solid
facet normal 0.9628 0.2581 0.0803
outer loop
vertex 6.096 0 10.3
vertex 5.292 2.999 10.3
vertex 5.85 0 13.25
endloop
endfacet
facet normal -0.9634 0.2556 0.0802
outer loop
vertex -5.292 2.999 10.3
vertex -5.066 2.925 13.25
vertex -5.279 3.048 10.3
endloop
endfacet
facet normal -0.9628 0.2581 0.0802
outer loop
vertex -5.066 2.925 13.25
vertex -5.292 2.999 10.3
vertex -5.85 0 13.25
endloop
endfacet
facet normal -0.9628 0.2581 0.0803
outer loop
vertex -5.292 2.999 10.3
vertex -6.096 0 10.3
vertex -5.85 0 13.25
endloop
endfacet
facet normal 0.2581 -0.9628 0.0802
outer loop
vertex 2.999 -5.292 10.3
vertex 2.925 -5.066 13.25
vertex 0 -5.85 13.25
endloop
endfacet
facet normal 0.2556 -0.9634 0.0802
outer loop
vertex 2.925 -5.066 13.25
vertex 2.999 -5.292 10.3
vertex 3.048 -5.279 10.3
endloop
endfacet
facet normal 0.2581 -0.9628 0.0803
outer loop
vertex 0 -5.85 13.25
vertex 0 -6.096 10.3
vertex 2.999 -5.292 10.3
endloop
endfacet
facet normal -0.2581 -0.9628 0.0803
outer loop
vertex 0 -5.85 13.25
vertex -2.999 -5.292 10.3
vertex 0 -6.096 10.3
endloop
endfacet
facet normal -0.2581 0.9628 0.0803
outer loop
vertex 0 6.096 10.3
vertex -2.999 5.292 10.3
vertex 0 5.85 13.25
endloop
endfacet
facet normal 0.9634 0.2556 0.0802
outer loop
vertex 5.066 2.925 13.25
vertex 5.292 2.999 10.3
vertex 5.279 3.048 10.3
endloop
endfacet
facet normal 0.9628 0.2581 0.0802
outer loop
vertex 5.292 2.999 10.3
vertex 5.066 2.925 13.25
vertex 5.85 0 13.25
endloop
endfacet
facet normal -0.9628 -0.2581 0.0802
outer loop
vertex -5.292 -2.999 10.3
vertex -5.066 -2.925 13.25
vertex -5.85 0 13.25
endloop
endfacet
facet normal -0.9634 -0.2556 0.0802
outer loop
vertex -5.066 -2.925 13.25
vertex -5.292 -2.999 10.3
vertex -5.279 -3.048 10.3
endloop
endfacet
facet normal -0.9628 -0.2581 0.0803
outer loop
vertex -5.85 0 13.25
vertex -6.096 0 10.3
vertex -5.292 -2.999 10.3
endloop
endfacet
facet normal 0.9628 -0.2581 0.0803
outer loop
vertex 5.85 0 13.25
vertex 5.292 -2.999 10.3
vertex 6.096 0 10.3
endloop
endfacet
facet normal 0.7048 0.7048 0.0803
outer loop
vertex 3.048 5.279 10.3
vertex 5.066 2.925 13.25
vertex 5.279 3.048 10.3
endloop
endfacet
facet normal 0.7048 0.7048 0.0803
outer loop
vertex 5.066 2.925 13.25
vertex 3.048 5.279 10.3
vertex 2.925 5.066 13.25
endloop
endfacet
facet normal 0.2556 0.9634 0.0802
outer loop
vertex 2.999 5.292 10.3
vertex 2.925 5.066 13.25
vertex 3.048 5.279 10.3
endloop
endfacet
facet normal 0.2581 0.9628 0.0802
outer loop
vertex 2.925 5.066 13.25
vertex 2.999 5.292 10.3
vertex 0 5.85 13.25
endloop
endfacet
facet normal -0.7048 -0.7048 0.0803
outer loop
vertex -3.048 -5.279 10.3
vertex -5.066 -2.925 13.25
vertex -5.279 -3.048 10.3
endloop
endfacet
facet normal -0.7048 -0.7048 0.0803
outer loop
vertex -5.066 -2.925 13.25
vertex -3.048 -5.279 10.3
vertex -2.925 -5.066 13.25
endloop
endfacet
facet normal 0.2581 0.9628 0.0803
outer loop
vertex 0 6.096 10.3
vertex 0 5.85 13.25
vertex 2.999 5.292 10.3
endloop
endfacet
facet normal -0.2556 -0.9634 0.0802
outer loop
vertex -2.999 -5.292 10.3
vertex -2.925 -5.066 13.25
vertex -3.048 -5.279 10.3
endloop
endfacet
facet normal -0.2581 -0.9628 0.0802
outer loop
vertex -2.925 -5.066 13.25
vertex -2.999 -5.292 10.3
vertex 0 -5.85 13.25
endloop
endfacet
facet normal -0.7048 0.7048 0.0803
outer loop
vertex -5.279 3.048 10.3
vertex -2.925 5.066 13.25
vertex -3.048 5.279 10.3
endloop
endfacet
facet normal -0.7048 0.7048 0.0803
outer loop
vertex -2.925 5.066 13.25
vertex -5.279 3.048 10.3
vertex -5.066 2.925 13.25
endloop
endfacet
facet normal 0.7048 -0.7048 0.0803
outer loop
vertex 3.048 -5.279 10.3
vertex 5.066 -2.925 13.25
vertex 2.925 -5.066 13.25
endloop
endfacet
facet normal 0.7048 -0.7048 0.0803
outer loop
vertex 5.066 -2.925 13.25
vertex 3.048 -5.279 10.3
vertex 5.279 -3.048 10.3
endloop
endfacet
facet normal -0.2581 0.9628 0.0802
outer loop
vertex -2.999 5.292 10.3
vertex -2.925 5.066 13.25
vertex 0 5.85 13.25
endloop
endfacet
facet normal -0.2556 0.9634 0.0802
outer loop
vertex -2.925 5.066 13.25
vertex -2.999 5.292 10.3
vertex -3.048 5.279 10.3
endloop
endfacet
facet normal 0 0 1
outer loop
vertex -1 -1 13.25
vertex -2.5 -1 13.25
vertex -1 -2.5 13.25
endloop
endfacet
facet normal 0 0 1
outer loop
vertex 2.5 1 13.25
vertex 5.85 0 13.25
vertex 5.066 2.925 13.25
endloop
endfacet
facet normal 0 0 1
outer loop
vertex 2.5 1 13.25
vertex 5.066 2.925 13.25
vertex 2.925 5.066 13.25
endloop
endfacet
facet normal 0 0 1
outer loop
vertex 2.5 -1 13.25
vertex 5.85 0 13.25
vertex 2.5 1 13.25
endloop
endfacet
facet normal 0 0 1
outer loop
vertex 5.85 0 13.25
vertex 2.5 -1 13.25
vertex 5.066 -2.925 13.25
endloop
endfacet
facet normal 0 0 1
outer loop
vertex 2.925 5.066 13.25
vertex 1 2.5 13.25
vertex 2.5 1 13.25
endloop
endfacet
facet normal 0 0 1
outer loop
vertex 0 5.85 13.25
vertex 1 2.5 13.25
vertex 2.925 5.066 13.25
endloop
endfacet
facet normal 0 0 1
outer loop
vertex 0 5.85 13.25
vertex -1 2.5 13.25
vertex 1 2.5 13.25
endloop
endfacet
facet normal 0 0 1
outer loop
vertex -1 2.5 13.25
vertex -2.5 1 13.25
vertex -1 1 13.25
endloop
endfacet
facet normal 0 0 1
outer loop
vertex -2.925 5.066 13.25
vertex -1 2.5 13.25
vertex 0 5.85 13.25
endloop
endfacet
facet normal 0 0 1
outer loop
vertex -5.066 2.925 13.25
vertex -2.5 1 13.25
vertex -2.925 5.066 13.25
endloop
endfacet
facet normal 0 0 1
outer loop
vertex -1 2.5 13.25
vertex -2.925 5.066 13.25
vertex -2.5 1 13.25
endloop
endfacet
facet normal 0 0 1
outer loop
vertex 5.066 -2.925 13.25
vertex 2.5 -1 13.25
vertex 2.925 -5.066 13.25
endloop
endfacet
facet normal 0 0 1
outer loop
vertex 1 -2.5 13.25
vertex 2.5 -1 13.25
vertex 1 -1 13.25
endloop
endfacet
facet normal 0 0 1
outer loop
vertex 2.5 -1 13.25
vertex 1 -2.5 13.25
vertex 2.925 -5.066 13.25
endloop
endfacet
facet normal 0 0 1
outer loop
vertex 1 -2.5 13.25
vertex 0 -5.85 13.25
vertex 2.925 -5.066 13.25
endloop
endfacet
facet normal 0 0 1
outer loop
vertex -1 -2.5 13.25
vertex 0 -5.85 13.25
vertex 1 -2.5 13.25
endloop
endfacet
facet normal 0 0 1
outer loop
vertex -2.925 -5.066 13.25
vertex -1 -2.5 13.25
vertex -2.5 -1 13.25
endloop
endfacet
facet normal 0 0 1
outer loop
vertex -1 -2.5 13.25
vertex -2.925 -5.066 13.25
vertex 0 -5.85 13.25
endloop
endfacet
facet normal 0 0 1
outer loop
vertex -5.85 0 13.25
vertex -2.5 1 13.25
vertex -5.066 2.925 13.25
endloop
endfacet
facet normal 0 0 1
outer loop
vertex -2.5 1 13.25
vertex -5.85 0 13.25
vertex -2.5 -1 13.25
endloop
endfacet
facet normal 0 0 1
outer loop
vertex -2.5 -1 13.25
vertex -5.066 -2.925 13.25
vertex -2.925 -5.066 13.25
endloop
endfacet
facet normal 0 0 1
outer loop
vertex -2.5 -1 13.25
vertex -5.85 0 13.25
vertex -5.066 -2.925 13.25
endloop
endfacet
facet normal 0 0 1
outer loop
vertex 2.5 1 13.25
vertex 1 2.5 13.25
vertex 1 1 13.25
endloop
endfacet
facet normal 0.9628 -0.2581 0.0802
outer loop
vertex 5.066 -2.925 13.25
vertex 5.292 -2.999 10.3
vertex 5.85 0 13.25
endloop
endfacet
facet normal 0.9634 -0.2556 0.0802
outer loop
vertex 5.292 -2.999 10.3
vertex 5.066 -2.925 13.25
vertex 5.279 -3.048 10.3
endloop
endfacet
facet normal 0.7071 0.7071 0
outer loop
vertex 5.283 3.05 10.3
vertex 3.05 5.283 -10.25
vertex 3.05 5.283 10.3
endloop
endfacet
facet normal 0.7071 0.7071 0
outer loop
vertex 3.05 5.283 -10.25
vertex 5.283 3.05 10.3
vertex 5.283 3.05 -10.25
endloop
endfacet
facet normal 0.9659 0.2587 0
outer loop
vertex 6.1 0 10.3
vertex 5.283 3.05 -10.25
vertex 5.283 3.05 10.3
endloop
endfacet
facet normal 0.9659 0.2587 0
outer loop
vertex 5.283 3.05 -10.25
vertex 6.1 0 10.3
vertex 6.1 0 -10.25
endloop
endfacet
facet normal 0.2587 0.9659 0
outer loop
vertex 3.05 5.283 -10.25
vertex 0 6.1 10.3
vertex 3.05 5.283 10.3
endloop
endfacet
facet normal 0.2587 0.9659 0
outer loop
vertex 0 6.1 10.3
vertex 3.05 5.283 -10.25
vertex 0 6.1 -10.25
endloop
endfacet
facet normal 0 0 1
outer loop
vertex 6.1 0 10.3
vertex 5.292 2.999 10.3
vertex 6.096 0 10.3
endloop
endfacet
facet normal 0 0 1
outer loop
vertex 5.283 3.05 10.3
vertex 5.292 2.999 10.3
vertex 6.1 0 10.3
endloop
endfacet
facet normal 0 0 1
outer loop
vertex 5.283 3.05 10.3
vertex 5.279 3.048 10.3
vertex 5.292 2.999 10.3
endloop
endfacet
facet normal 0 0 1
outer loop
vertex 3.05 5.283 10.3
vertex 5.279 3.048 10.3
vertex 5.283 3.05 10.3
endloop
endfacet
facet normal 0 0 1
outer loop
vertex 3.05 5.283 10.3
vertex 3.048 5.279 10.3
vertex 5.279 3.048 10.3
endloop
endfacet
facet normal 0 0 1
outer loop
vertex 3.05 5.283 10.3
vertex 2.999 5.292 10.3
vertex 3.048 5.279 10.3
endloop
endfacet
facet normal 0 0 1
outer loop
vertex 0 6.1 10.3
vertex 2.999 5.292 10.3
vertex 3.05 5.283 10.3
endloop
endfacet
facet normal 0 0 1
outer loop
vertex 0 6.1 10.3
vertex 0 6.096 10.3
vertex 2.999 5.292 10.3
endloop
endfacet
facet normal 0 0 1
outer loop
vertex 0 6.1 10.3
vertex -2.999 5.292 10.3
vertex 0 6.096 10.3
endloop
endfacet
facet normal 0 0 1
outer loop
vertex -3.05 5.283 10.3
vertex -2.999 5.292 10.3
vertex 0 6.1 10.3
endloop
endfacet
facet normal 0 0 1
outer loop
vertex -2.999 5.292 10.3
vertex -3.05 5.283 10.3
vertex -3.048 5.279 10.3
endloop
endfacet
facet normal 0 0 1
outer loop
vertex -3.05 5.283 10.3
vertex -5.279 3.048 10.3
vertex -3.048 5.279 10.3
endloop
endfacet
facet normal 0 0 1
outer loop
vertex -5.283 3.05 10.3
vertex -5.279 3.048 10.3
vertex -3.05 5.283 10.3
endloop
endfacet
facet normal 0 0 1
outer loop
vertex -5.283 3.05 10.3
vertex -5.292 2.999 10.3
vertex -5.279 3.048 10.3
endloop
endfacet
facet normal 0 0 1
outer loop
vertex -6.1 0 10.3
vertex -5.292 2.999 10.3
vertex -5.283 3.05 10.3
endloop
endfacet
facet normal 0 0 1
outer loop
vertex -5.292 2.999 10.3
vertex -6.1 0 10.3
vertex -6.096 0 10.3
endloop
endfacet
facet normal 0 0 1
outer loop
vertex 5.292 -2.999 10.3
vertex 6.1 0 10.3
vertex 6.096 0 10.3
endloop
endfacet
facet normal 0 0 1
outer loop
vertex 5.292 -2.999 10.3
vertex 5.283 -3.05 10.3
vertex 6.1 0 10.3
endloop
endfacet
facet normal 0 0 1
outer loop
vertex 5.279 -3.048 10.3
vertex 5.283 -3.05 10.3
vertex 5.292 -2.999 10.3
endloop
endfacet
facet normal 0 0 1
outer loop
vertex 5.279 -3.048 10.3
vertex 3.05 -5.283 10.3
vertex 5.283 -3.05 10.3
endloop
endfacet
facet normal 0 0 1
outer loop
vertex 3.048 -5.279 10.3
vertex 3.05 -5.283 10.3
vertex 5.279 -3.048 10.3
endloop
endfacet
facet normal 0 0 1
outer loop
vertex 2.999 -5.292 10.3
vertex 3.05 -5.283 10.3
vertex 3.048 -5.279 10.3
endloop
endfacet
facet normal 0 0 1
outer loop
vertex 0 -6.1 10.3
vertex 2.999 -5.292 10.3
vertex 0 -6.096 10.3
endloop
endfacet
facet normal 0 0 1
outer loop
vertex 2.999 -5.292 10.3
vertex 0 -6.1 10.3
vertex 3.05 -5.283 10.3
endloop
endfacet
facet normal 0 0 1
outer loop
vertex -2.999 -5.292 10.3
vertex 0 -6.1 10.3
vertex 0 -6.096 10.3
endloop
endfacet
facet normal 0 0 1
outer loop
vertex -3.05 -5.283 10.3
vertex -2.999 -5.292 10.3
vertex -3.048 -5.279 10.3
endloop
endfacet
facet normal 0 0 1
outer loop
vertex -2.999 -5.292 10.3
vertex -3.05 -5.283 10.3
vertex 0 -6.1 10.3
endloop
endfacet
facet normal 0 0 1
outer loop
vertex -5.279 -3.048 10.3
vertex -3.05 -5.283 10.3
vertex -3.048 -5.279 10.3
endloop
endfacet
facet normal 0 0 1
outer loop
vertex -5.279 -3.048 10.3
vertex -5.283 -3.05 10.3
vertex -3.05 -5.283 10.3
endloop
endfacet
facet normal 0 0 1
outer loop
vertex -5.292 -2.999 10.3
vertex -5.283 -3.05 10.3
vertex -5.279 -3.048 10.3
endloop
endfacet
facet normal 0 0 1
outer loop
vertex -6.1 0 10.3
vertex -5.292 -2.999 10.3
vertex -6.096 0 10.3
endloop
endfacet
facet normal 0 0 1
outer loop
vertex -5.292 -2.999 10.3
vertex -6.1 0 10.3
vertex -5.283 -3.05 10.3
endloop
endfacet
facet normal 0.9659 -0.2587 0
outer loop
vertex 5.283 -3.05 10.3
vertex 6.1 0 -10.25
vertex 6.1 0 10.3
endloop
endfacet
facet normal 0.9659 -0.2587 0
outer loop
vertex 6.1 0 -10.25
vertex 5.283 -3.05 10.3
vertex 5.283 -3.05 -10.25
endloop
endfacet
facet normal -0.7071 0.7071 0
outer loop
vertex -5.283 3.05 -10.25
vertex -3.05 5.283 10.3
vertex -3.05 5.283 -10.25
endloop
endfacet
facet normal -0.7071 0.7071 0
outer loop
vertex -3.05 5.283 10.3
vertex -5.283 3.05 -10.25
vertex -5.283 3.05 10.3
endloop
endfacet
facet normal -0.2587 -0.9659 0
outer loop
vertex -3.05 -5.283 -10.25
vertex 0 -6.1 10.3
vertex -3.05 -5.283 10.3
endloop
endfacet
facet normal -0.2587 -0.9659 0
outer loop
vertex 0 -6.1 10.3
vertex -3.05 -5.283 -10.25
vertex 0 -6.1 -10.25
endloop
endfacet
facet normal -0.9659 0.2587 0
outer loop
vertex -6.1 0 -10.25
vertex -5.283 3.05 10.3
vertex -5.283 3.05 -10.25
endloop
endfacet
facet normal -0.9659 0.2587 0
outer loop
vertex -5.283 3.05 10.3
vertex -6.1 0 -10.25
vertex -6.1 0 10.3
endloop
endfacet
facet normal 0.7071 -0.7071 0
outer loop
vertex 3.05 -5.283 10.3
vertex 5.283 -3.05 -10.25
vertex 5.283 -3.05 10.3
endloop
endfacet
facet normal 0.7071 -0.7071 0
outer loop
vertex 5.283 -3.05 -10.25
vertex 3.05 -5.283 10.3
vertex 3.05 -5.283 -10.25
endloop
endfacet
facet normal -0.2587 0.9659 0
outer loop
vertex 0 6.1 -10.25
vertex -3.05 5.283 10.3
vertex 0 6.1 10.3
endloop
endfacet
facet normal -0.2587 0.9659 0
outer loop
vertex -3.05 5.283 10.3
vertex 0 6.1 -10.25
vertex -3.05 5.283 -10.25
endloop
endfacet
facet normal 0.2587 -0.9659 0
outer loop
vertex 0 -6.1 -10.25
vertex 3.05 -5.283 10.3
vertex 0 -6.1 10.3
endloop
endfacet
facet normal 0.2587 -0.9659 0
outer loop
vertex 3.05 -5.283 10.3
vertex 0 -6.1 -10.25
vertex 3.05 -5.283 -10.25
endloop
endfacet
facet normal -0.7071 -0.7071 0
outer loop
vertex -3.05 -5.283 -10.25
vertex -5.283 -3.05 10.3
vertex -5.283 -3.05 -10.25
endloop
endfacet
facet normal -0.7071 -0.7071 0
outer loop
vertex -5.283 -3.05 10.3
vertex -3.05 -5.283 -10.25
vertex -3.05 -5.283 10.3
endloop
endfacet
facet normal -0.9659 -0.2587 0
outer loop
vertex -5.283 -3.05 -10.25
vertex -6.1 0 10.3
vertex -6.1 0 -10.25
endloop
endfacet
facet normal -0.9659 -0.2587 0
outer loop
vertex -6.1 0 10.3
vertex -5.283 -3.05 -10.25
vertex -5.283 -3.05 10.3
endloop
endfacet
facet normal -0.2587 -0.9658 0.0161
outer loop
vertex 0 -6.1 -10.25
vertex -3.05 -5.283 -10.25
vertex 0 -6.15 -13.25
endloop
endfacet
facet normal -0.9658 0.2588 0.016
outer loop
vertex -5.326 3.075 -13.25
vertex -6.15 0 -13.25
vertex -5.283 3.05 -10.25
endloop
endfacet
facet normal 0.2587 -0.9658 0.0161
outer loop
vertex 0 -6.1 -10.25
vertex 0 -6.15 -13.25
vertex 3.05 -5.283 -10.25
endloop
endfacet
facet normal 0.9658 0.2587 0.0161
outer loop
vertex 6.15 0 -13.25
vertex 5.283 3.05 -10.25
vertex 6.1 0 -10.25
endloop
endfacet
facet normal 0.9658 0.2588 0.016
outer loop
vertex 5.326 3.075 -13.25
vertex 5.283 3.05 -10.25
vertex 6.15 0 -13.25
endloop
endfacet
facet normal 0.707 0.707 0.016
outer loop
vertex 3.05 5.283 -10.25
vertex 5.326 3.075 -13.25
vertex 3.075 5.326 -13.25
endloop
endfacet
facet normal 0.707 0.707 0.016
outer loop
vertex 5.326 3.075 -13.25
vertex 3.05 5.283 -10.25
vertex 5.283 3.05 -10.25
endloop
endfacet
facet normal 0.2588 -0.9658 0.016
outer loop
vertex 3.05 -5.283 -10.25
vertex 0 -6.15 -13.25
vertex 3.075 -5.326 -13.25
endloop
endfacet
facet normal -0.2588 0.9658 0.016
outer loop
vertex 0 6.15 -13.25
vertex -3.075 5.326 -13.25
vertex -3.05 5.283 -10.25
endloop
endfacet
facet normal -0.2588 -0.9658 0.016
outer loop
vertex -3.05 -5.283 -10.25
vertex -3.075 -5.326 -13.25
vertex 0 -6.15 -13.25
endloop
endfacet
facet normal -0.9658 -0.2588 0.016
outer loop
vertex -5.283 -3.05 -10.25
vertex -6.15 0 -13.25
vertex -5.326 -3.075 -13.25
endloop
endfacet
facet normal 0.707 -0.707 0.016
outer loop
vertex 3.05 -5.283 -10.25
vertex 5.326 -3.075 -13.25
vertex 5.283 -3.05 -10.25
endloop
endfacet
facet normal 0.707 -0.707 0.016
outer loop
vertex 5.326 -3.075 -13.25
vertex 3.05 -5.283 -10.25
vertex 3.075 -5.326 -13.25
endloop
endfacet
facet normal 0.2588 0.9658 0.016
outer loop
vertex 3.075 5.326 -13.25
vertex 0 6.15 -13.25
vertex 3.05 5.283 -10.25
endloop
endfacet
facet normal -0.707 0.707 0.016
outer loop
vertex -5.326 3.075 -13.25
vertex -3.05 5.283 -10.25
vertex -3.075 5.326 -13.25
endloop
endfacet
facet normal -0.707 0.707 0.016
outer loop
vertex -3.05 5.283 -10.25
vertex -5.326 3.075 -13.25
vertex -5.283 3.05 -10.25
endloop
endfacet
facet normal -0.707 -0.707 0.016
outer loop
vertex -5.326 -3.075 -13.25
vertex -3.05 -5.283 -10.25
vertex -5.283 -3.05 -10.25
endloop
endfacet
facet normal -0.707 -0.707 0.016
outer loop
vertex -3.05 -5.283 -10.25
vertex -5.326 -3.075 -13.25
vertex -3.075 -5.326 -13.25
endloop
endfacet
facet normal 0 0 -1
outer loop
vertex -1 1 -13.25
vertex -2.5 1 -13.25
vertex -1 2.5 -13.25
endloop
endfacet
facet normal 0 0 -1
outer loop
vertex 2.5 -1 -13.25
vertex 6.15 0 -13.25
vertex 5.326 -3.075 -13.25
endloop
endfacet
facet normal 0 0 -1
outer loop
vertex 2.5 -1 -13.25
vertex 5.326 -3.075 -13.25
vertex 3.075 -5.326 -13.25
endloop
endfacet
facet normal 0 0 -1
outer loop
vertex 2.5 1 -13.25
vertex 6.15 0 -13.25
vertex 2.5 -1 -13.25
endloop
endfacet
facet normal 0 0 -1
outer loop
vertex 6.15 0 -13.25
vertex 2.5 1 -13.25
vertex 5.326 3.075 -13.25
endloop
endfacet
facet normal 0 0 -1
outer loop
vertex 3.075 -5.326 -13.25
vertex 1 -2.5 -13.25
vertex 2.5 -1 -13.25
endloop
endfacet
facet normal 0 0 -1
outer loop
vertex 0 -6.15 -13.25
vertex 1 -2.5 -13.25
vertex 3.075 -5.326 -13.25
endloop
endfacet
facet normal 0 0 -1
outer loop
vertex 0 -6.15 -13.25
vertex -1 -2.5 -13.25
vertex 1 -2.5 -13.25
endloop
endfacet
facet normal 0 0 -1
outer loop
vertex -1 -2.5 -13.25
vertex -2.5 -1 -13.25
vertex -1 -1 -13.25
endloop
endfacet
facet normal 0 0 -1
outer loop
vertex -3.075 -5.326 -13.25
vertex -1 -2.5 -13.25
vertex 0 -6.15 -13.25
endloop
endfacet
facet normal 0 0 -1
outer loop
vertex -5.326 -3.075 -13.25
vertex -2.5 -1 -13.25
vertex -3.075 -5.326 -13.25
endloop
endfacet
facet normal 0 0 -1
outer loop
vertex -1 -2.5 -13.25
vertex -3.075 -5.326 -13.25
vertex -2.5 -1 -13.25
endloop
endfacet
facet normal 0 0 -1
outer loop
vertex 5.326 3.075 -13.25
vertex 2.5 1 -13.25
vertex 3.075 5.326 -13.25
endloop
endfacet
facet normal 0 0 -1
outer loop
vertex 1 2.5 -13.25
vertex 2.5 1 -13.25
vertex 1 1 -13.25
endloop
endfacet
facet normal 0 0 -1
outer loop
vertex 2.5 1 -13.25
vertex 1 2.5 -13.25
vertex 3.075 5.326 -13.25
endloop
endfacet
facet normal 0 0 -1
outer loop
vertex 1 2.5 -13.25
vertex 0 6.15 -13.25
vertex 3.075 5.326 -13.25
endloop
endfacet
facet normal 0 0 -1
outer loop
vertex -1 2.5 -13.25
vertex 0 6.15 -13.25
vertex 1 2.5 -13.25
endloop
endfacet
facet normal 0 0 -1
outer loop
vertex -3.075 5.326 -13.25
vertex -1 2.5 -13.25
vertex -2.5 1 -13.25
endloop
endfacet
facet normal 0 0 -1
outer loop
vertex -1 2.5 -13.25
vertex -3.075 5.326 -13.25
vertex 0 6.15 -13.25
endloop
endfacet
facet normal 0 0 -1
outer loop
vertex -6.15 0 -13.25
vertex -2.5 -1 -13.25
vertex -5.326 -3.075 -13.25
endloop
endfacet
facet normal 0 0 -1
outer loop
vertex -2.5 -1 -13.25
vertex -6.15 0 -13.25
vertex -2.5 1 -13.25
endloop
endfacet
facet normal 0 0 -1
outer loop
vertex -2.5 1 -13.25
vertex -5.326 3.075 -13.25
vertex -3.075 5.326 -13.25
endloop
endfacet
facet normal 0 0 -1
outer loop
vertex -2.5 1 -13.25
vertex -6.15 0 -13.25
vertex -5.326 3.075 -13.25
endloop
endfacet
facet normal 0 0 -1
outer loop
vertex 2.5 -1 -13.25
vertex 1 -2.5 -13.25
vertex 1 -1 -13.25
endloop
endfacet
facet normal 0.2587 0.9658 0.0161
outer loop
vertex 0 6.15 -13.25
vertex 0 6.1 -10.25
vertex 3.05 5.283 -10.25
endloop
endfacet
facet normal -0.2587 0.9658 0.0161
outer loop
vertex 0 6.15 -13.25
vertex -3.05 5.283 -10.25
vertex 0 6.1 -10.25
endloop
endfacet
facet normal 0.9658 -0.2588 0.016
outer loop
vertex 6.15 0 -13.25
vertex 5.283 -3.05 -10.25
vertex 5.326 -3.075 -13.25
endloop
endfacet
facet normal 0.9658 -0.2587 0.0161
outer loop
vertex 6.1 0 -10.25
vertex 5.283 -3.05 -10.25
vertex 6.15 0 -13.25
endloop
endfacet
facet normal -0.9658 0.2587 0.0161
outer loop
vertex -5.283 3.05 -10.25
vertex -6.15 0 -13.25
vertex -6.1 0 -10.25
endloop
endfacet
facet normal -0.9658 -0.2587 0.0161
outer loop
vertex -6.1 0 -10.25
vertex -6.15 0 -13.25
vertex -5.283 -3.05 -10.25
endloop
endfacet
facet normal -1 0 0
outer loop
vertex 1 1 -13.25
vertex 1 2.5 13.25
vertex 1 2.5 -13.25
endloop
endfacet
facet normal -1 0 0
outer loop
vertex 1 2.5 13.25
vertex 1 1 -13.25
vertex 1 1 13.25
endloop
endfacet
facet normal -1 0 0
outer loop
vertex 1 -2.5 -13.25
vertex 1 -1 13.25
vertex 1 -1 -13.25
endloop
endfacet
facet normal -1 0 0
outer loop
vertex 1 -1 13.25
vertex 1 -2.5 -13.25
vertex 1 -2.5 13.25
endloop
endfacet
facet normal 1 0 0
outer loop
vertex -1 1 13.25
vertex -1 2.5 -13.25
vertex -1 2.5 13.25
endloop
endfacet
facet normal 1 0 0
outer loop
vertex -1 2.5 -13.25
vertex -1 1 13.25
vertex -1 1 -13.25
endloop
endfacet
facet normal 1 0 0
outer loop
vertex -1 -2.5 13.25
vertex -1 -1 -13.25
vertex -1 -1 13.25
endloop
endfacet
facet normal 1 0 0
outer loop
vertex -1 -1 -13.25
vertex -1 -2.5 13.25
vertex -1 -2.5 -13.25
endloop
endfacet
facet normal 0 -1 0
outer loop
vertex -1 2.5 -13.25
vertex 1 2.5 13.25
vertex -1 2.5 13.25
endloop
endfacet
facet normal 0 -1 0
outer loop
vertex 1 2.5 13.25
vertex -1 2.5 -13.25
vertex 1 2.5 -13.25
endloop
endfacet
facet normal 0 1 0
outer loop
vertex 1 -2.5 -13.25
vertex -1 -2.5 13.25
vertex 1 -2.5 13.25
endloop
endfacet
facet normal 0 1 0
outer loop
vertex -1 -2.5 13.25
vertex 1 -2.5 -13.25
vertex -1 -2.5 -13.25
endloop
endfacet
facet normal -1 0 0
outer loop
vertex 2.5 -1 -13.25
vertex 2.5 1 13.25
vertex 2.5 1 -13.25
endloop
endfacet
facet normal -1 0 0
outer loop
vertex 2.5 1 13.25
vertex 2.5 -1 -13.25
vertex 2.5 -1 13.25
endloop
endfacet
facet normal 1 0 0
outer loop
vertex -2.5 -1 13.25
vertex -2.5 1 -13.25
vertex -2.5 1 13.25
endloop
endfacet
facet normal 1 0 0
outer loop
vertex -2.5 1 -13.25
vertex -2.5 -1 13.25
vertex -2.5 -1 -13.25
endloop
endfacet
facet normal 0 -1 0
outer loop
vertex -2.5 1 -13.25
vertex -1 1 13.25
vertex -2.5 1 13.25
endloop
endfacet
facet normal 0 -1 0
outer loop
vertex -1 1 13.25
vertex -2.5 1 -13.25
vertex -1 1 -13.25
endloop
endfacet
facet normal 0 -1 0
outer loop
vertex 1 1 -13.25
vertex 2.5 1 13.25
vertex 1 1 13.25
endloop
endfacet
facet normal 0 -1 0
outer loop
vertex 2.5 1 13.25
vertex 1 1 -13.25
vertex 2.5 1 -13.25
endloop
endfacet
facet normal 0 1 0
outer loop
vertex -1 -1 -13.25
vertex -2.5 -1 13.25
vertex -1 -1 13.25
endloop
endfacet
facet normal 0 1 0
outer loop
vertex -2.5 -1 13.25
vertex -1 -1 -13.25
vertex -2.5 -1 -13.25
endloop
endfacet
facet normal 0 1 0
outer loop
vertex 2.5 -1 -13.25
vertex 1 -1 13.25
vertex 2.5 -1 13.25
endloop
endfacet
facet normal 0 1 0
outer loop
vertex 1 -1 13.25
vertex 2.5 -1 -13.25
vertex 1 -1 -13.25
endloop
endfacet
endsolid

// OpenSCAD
/*
 * Omni Wheel Hub.scad
 *
 * These hubs work with the Nexus 58mm Plastic Omni Wheel:
 * https://www.robotshop.com/products/58mm-plastic-omni-wheel-compatible-servos-lego-mindstorms-nxt
 * 
 * Brown Dog Gadgets
 *
 * Pete Prodoehl <pete@browndoggadgets.com>
 *
 */


$fn=50;

Radius1     = 5.0/2;
Plus_Height = 50;
Plus_Width  = 2.0*1.0;
Overhang    = 0.05*1.0;

hubDiameter = 12.2; // adjust if fit is too tight or too loose
hubHeight   = 26.6;



difference() {

    union() {
            
        translate([0,0,hubHeight/2-1.55])
                cylinder(d1=hubDiameter, d2=hubDiameter-0.5, h=3, $fn=12, center=true);
            
        translate([0,0,0])
                cylinder(d=hubDiameter, h=hubHeight-6, $fn=12, center=true);
    
        translate([0,0,-hubHeight/2+1.55])
                cylinder(d1=hubDiameter+0.1, d2=hubDiameter, h=3, $fn=12, center=true);
            
    }
    
    translate([0,0,-hubHeight])
        plus();

}



module plus() {

    union() {
        translate([-Plus_Width/2, -Radius1, -Overhang]) 
            cube([Plus_Width, Radius1*2, Plus_Height+Overhang*2]);
        translate([-Radius1, -Plus_Width/2, -Overhang]) 
            cube([Radius1*2, Plus_Width, Plus_Height+Overhang*2]);
    }
    
}
